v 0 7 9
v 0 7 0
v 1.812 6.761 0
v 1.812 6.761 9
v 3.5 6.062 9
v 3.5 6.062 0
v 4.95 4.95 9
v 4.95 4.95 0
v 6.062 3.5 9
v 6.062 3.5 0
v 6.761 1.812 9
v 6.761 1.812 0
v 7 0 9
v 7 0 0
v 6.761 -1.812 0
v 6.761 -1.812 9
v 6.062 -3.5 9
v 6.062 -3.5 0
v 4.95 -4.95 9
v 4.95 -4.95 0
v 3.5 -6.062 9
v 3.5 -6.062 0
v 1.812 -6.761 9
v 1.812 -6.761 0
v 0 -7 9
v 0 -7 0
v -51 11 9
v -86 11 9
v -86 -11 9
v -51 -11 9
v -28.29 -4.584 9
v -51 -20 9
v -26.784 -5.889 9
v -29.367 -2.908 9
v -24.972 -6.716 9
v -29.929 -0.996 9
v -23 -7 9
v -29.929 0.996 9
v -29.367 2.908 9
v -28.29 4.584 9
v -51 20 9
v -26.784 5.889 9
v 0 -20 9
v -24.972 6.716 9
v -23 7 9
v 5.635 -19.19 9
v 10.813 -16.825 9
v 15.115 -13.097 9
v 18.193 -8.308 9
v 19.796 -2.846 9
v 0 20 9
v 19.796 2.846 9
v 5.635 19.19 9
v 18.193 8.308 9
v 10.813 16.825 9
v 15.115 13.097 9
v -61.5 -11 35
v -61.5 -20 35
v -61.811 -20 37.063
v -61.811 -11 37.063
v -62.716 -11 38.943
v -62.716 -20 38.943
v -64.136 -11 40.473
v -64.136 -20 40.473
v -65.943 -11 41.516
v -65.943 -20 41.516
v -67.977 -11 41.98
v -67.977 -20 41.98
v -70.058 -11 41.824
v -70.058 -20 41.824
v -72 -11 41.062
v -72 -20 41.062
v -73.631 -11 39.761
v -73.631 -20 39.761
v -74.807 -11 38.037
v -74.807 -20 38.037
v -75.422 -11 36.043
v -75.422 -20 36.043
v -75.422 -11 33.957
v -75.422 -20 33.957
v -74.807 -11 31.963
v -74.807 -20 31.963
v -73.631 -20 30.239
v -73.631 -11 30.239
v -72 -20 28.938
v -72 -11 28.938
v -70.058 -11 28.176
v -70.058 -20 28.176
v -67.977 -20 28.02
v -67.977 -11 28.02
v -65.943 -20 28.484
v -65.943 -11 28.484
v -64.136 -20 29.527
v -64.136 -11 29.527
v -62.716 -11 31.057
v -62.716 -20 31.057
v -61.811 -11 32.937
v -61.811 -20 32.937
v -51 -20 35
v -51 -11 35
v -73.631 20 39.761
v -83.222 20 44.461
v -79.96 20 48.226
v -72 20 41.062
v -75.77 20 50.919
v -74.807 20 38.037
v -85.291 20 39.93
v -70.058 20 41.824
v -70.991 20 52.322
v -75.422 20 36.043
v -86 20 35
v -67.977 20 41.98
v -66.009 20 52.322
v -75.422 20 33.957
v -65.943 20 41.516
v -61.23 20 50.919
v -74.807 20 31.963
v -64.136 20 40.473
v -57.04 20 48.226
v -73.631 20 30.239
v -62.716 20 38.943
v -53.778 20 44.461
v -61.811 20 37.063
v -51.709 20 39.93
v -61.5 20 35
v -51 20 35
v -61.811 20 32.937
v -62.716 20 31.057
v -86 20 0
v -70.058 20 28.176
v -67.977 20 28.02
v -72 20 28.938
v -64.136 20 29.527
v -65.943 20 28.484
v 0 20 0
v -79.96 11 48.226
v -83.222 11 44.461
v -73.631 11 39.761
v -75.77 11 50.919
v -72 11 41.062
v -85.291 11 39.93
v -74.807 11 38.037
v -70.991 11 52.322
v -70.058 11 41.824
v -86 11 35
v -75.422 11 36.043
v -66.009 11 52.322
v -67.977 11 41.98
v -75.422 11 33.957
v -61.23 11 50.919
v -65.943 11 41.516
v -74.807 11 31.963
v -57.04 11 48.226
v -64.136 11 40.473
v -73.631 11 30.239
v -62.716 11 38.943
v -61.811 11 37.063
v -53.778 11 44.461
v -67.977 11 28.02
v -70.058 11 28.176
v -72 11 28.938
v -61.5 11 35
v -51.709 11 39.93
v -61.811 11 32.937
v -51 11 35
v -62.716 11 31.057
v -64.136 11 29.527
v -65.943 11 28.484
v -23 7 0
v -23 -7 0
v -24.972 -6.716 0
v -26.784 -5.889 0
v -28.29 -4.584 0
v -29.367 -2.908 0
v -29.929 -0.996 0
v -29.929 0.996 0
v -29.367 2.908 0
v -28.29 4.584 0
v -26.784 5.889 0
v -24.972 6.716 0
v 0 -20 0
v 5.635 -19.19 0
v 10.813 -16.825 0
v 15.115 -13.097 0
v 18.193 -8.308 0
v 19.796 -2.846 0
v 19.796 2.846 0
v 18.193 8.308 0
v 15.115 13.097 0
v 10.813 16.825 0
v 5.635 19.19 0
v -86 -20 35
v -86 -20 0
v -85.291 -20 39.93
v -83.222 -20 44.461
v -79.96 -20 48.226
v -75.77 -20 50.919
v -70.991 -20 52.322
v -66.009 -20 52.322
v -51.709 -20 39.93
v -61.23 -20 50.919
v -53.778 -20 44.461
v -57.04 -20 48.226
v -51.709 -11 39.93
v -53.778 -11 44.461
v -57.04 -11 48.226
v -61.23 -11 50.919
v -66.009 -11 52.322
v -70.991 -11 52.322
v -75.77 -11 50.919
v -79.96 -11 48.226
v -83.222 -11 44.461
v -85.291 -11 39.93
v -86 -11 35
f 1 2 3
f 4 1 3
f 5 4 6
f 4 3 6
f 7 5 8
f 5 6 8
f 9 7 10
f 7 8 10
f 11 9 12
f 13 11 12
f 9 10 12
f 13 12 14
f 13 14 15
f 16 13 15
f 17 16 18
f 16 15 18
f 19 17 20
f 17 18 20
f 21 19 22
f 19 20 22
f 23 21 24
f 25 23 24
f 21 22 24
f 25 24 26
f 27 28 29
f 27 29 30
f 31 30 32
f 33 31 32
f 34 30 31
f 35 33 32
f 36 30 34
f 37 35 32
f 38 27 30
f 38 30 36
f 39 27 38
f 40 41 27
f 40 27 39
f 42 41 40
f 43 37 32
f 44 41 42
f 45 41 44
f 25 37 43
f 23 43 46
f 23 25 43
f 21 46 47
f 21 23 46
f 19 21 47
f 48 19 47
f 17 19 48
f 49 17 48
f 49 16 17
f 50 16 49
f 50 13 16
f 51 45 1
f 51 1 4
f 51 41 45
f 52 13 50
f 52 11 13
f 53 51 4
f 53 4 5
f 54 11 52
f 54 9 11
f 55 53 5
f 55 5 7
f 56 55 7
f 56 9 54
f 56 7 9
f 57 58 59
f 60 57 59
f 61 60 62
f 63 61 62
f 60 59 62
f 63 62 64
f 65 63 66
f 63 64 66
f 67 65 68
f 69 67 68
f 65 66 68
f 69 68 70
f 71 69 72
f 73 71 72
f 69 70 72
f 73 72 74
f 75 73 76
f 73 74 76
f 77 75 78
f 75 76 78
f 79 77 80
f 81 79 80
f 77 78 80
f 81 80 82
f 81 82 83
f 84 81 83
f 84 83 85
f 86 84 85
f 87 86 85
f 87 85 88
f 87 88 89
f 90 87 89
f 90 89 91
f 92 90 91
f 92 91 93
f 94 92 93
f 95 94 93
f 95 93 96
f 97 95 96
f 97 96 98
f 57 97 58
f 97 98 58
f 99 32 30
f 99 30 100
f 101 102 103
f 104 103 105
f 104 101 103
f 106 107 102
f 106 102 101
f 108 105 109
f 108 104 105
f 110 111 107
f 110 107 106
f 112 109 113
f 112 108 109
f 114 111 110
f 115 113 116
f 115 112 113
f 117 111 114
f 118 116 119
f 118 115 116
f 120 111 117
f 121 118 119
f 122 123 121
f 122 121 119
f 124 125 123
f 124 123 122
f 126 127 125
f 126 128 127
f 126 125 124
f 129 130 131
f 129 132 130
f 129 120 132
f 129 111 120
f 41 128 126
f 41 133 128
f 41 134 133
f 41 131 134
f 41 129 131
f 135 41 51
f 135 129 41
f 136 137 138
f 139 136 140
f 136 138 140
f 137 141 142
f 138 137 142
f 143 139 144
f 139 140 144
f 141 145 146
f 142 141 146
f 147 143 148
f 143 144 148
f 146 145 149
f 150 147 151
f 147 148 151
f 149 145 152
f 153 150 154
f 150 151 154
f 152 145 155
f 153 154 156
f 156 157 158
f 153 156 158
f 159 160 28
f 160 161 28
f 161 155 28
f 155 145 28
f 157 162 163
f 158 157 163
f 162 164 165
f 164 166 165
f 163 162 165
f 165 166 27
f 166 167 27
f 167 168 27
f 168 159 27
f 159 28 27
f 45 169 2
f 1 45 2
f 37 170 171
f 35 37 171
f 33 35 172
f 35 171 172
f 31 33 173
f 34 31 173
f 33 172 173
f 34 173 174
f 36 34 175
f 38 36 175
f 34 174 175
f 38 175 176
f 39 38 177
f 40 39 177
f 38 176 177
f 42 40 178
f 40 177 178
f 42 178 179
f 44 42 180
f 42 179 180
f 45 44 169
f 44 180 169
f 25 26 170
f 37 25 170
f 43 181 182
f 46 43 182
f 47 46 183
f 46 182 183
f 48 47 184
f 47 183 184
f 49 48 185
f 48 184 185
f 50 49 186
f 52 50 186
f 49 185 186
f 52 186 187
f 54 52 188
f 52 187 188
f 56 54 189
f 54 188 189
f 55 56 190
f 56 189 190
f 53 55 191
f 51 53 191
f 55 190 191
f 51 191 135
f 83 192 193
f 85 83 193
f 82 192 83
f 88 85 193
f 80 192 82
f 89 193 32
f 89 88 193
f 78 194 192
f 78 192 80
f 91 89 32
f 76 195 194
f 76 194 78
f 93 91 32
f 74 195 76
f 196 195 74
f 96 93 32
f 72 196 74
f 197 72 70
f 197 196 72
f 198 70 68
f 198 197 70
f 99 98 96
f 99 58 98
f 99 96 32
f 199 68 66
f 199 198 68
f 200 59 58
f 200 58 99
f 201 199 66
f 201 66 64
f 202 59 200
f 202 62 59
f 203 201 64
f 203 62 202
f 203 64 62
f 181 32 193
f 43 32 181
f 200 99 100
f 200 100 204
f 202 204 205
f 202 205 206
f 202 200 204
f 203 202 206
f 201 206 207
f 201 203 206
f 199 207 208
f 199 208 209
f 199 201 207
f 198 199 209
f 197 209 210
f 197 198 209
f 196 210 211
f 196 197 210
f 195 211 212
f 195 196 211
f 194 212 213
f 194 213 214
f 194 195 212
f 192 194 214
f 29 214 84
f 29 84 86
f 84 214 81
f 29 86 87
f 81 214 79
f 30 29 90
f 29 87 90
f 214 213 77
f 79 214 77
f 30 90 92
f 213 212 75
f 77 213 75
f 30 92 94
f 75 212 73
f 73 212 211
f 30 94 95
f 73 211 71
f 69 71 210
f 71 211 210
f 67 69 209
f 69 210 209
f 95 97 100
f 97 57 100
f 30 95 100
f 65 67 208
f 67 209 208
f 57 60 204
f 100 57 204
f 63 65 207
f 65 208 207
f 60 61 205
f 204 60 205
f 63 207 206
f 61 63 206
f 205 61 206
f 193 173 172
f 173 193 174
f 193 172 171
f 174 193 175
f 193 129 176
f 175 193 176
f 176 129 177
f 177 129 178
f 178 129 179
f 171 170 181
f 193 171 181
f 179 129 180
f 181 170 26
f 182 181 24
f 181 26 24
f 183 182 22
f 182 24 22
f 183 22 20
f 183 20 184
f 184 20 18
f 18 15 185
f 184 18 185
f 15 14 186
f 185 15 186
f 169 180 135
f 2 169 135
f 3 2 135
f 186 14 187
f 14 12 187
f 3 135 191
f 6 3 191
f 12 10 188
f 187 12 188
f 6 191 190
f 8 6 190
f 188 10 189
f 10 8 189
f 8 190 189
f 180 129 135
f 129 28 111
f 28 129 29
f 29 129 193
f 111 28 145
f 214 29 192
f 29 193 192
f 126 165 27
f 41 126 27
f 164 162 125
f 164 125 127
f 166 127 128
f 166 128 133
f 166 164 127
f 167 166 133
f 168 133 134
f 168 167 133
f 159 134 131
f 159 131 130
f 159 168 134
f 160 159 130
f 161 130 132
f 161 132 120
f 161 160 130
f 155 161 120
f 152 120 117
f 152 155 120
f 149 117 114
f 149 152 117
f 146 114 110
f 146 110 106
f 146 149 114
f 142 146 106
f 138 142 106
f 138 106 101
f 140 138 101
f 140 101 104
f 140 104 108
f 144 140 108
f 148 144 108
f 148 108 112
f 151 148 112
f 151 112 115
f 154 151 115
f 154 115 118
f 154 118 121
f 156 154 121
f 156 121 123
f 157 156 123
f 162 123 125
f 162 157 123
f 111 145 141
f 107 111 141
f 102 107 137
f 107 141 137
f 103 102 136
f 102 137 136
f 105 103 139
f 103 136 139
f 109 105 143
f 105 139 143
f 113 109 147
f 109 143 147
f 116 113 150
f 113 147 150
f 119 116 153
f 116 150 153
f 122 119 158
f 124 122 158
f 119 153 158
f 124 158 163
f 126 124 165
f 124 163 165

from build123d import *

# Parameters (mm, degrees)
DODANIE_WYCI_GNI_CIE1_DEPTH = 9
SZKIC3_R                    = 17.5
SZKIC3_R_2                  = 7
DODANIE_WYCI_GNI_CIE2_DEPTH = 9
DODANIE_WYCI_GNI_CIE3_START = -9
SZKIC4_R                    = 17.5
SZKIC4_R_2                  = 7
DODANIE_WYCI_GNI_CIE3_DEPTH = 9


with BuildPart() as part:
    # Szkic1 → Dodanie-wyciągnięcie1 (new body)
    with BuildSketch(Plane.XY):
        with BuildLine():
            Line((0, 20), (-86, 20))
            Line((-86, 20), (-86, -20))
            Line((-86, -20), (0, -20))
            ThreePointArc((0, -20), (20, 0), (0, 20))
        make_face()
        with BuildLine():
            ThreePointArc((-23, -7), (-30, 0), (-23, 7))
            Line((-23, 7), (0, 7))
            ThreePointArc((0, 7), (4.949747468, 4.949747468), (7, 0))
            ThreePointArc((7, 0), (4.949747468, -4.949747468), (0, -7))
            Line((0, -7), (-23, -7))
        make_face(mode=Mode.SUBTRACT)
    extrude(amount=DODANIE_WYCI_GNI_CIE1_DEPTH)

    # Szkic3 → Dodanie-wyciągnięcie2 (add)
    # profile 1 of 2: a face of its own
    with BuildSketch(Plane.XZ.offset(20)):
        with Locations((-68.5, 35)):
            Circle(SZKIC3_R)
        with Locations((-68.5, 35)):
            Circle(SZKIC3_R_2, mode=Mode.SUBTRACT)
    # profile 2 of 2: a face of its own
    with BuildSketch(Plane.XZ.offset(20)):
        with BuildLine():
            Line((-86, 35), (-86, 9))
            Line((-86, 9), (-51, 9))
            Line((-51, 9), (-51, 35))
            ThreePointArc((-51, 35), (-68.5, 17.5), (-86, 35))
        make_face()
    extrude(amount=-DODANIE_WYCI_GNI_CIE2_DEPTH)

    # Szkic4 → Dodanie-wyciągnięcie3 (add)
    # profile 1 of 2: a face of its own
    with BuildSketch(Plane(origin=(0, 20, 0), x_dir=(1, 0, 0), z_dir=(0, 1, 0)).offset(DODANIE_WYCI_GNI_CIE3_START)):
        with BuildLine():
            Line((-51, -9), (-86, -9))
            Line((-86, -9), (-86, -35))
            ThreePointArc((-86, -35), (-68.5, -17.5), (-51, -35))
            Line((-51, -35), (-51, -9))
        make_face()
    # profile 2 of 2: a face of its own
    with BuildSketch(Plane(origin=(0, 20, 0), x_dir=(1, 0, 0), z_dir=(0, 1, 0)).offset(DODANIE_WYCI_GNI_CIE3_START)):
        with Locations((-68.5, -35)):
            Circle(SZKIC4_R)
        with Locations((-68.5, -35)):
            Circle(SZKIC4_R_2, mode=Mode.SUBTRACT)
    extrude(amount=DODANIE_WYCI_GNI_CIE3_DEPTH)


solid = part.part
